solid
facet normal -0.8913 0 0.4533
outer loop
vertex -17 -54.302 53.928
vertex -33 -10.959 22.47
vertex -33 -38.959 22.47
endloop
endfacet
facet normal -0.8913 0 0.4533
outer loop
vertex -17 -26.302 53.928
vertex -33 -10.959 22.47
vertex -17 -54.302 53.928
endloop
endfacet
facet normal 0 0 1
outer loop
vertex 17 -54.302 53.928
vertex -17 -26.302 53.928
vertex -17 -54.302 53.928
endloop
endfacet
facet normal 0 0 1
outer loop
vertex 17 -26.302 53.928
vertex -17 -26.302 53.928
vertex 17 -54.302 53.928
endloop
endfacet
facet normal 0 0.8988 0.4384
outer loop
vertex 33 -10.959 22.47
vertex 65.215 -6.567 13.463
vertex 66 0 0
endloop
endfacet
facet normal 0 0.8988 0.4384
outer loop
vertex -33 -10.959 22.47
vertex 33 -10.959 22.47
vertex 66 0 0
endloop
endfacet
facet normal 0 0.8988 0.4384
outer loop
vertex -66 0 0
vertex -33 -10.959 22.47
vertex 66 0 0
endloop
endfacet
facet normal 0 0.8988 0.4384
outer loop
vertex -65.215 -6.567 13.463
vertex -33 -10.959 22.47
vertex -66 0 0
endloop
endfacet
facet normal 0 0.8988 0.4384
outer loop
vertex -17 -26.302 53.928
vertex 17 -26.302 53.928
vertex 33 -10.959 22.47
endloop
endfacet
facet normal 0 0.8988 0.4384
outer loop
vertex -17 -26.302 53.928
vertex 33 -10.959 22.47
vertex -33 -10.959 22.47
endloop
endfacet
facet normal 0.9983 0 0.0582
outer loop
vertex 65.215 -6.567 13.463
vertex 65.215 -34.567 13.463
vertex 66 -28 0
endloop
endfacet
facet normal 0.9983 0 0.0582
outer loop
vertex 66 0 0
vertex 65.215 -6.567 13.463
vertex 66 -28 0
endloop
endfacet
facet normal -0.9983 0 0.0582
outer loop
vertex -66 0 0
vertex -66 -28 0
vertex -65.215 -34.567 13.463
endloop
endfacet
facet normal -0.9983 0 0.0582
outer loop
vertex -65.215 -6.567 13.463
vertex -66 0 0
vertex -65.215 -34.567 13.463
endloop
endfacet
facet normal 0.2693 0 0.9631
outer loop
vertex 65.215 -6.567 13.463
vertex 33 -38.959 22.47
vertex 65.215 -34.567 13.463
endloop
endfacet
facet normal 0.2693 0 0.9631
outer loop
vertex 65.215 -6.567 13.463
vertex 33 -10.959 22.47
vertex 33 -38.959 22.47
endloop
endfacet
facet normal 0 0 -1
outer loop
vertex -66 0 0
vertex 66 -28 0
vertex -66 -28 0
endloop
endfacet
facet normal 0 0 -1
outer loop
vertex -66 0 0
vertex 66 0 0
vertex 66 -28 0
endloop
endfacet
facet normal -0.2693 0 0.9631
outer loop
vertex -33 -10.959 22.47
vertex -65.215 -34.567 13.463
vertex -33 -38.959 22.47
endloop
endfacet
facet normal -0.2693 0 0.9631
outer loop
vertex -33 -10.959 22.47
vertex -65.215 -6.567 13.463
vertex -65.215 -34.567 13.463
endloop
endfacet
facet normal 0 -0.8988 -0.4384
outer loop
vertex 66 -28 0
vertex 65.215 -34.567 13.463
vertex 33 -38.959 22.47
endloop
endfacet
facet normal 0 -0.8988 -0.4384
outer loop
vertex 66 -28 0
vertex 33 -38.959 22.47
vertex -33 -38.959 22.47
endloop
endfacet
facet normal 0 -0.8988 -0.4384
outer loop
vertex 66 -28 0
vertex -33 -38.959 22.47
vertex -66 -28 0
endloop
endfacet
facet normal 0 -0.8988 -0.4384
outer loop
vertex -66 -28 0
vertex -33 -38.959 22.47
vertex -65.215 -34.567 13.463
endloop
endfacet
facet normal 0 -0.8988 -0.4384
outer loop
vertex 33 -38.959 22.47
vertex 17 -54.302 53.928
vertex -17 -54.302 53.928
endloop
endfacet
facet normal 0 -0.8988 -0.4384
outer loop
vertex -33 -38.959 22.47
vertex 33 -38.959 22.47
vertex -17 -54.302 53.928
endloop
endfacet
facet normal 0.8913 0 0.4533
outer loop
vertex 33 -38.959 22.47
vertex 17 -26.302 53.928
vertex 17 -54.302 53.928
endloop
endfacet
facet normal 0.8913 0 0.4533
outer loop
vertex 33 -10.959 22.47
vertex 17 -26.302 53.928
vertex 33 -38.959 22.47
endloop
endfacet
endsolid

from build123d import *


with BuildPart() as f6:
    # F5 (on plane+point) → F6 section 0
    with BuildSketch(Plane(origin=(0, -22.6192606546, -11.0321505505), x_dir=(-1, 0, 0), z_dir=(0, 0.8987940463, 0.4383711468))):
        Polygon((-66, 12.2743921101), (0, 12.2743921101), (66, 12.2743921101), (65.2149606564, 27.2538351314), (33, 37.2743921101), (17, 72.2743921101), (0, 72.2743921101), (-17, 72.2743921101), (-33, 37.2743921101), (-65.2149606564, 27.2538351314), align=None)
    # F2 (on line) → F6 section 1
    with BuildSketch(Plane(origin=(0, 0, 0), x_dir=(-1, 0, 0), z_dir=(0, 0.8987940463, 0.4383711468))):
        Polygon((-66, 0), (0, 0), (66, 0), (65.2149606564, 14.9794430213), (33, 25), (17, 60), (0, 60), (-17, 60), (-33, 25), (-65.2149606564, 14.9794430213), align=None)
    loft()


solid = f6.part
